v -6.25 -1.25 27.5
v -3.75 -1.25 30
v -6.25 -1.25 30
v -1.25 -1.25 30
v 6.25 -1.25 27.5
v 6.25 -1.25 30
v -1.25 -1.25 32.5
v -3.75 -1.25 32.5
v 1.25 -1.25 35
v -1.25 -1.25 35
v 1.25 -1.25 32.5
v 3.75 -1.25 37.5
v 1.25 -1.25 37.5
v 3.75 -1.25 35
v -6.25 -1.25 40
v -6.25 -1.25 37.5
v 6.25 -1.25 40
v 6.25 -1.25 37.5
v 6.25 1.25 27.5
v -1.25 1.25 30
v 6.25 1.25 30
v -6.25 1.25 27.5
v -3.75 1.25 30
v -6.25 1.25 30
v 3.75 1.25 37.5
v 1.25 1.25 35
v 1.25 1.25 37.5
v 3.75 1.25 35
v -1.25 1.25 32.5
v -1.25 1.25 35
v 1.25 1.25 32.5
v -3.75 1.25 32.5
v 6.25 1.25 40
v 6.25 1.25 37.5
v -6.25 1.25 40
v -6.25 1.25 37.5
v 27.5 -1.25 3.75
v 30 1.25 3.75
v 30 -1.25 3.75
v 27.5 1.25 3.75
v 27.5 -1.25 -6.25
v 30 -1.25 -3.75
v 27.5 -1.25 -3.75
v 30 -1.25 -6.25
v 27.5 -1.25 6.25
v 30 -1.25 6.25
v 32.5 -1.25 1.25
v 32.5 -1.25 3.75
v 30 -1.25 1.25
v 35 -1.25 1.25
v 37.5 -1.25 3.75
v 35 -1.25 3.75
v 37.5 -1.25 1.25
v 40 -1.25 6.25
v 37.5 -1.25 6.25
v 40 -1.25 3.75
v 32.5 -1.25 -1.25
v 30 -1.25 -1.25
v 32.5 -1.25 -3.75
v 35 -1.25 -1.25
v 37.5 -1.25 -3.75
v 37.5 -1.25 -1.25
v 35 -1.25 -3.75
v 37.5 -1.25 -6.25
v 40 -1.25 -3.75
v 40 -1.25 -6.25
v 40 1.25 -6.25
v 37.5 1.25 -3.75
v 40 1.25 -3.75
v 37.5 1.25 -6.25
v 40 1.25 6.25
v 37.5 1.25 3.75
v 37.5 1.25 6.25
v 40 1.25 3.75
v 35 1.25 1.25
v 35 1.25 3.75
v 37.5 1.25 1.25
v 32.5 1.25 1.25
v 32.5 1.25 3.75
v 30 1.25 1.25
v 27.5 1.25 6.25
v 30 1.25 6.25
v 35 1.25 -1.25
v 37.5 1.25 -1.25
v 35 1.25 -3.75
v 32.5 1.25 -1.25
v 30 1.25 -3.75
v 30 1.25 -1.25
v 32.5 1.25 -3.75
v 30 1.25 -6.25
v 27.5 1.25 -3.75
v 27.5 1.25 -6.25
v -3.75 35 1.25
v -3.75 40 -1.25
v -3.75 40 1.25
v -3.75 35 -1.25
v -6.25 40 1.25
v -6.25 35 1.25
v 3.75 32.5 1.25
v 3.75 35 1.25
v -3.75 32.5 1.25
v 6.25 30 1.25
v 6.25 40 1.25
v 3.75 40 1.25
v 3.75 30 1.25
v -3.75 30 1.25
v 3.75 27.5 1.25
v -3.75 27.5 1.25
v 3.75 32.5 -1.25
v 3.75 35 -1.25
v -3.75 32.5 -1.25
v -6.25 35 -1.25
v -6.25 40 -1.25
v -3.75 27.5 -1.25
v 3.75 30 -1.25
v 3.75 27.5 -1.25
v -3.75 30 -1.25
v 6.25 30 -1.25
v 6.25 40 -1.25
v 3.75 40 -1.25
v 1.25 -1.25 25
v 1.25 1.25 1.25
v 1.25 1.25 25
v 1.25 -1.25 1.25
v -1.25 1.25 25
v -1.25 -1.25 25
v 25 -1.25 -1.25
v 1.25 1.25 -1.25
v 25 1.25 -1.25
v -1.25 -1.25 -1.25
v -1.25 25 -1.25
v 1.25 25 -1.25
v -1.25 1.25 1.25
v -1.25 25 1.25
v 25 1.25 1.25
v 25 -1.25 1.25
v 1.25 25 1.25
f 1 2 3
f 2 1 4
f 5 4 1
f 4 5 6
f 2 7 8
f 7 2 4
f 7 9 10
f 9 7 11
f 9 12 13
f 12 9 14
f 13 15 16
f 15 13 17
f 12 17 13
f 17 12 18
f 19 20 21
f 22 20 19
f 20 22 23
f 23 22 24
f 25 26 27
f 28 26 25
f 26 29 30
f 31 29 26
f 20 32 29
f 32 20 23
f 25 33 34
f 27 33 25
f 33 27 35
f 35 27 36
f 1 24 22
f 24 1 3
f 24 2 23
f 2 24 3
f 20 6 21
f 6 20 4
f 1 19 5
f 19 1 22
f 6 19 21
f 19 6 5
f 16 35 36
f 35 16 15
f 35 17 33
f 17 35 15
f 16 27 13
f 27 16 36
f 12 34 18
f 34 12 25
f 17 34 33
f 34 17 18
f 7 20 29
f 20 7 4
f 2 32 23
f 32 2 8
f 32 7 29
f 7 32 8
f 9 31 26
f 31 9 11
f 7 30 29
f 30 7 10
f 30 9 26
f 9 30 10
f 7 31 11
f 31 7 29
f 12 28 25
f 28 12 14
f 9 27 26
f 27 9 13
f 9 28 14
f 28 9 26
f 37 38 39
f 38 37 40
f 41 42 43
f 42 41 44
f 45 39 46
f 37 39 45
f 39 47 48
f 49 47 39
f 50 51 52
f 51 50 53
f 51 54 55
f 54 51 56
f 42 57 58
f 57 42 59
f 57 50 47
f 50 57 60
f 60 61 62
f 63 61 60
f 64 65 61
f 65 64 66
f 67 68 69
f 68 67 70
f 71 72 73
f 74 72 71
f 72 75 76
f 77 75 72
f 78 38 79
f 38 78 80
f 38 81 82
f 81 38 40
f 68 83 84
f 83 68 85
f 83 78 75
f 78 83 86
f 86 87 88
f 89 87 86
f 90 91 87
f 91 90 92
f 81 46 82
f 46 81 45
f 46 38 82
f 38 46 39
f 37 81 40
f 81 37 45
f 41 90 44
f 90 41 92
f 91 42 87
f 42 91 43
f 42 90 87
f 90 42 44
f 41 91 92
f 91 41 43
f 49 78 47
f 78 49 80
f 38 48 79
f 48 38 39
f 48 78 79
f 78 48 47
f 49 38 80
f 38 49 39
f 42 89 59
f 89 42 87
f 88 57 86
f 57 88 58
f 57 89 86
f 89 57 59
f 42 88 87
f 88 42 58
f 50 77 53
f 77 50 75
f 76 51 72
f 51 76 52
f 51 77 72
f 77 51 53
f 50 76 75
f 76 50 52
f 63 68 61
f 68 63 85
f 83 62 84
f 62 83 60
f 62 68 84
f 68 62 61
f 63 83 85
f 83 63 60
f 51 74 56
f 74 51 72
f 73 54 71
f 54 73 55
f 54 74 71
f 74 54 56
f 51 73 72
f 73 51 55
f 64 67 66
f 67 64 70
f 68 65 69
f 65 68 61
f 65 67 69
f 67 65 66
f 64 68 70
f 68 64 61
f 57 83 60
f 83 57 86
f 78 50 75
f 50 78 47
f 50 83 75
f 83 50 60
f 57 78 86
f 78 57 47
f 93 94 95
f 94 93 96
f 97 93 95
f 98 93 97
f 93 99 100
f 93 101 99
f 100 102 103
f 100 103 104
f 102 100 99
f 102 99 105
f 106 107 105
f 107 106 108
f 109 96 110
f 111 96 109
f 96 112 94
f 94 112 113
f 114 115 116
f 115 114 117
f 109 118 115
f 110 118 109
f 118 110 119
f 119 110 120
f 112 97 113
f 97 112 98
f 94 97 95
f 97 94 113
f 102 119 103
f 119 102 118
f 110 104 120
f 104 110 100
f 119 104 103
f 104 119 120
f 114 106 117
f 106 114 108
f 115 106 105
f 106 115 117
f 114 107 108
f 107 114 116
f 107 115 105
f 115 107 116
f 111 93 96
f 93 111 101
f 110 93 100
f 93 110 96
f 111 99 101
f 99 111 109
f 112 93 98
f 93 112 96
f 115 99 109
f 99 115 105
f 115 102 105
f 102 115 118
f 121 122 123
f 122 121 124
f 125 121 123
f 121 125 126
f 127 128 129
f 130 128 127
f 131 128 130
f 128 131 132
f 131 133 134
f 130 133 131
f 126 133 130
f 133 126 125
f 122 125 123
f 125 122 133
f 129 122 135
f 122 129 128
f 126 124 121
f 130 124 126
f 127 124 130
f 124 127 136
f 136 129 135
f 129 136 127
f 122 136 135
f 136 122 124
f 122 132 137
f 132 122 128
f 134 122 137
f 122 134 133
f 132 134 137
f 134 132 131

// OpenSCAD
draw_labels=1;

scale([25,25,25]) {
	translate([-0.05,-0.05,-0.05])
		cube([0.1,0.1,1.05]);
	if (draw_labels) {
		translate([-0.25,0.05,1.1])
			scale([1/10,1/10,1/10])
				rotate(90,[1,0,0])
					drawtext("z");
	}

	translate([-0.05,-0.05,-0.05])
		cube([1.05,0.1,0.1]);
	if (draw_labels) {
		rotate(90,[0,1,0])
			translate([-0.25,0.05,1.1])
				scale([1/10,1/10,1/10])
					rotate(90,[1,0,0])
						drawtext("x");
	}

	translate([-0.05,-0.05,-0.05])
		cube([0.1,1.05,0.1]);
	if (draw_labels) {
		rotate(-90,[1,0,0])
			translate([-0.25,0.05,1.1])
				scale([1/10,1/10,1/10])
					rotate(90,[1,0,0])
						drawtext("y");
	}
}

//Draw character set
//scale([2,2,2]) drawtext(" !\"#$%&'()*+,-./0123456789:;<=>?@ABCDEFGHIJKLMNOPQRSTUVWXYZ[\\]^_`abcdefghijklmnopqrstuvwxyz{|}");

module drawtext(text) {
	//Characters
	chars = " !\"#$%&'()*+,-./0123456789:;<=>?@ABCDEFGHIJKLMNOPQRSTUVWXYZ[\\]^_`abcdefghijklmnopqrstuvwxyz{|}";

	//Chracter table defining 5x7 characters
	//Adapted from: http://www.geocities.com/dinceraydin/djlcdsim/chartable.js
	char_table = [ [ 0, 0, 0, 0, 0, 0, 0],
                  [ 4, 0, 4, 4, 4, 4, 4],
                  [ 0, 0, 0, 0,10,10,10],
                  [10,10,31,10,31,10,10],
                  [ 4,30, 5,14,20,15, 4],
                  [ 3,19, 8, 4, 2,25,24],
                  [13,18,21, 8,20,18,12],
                  [ 0, 0, 0, 0, 8, 4,12],
                  [ 2, 4, 8, 8, 8, 4, 2],
                  [ 8, 4, 2, 2, 2, 4, 8],
                  [ 0, 4,21,14,21, 4, 0],
                  [ 0, 4, 4,31, 4, 4, 0],
                  [ 8, 4,12, 0, 0, 0, 0],
                  [ 0, 0, 0,31, 0, 0, 0],
                  [12,12, 0, 0, 0, 0, 0],
                  [ 0,16, 8, 4, 2, 1, 0],
                  [14,17,25,21,19,17,14],
                  [14, 4, 4, 4, 4,12, 4],
                  [31, 8, 4, 2, 1,17,14],
                  [14,17, 1, 2, 4, 2,31],
                  [ 2, 2,31,18,10, 6, 2],
                  [14,17, 1, 1,30,16,31],
                  [14,17,17,30,16, 8, 6],
                  [ 8, 8, 8, 4, 2, 1,31],
                  [14,17,17,14,17,17,14],
                  [12, 2, 1,15,17,17,14],
                  [ 0,12,12, 0,12,12, 0],
                  [ 8, 4,12, 0,12,12, 0],
                  [ 2, 4, 8,16, 8, 4, 2],
                  [ 0, 0,31, 0,31, 0, 0],
                  [16, 8, 4, 2, 4, 8,16],
                  [ 4, 0, 4, 2, 1,17,14],
                  [14,21,21,13, 1,17,14],
                  [17,17,31,17,17,17,14],
                  [30,17,17,30,17,17,30],
                  [14,17,16,16,16,17,14],
                  [30,17,17,17,17,17,30],
                  [31,16,16,30,16,16,31],
                  [16,16,16,30,16,16,31],
                  [15,17,17,23,16,17,14],
                  [17,17,17,31,17,17,17],
                  [14, 4, 4, 4, 4, 4,14],
                  [12,18, 2, 2, 2, 2, 7],
                  [17,18,20,24,20,18,17],
                  [31,16,16,16,16,16,16],
                  [17,17,17,21,21,27,17],
                  [17,17,19,21,25,17,17],
                  [14,17,17,17,17,17,14],
                  [16,16,16,30,17,17,30],
                  [13,18,21,17,17,17,14],
                  [17,18,20,30,17,17,30],
                  [30, 1, 1,14,16,16,15],
                  [ 4, 4, 4, 4, 4, 4,31],
                  [14,17,17,17,17,17,17],
                  [ 4,10,17,17,17,17,17],
                  [10,21,21,21,17,17,17],
                  [17,17,10, 4,10,17,17],
                  [ 4, 4, 4,10,17,17,17],
                  [31,16, 8, 4, 2, 1,31],
                  [14, 8, 8, 8, 8, 8,14],
                  [ 0, 1, 2, 4, 8,16, 0],
                  [14, 2, 2, 2, 2, 2,14],
                  [ 0, 0, 0, 0,17,10, 4],
                  [31, 0, 0, 0, 0, 0, 0],
                  [ 0, 0, 0, 0, 2, 4, 8],
                  [15,17,15, 1,14, 0, 0],
                  [30,17,17,25,22,16,16],
                  [14,17,16,16,14, 0, 0],
                  [15,17,17,19,13, 1, 1],
                  [14,16,31,17,14, 0, 0],
                  [ 8, 8, 8,28, 8, 9, 6],
                  [14, 1,15,17,15, 0, 0],
                  [17,17,17,25,22,16,16],
                  [14, 4, 4, 4,12, 0, 4],
                  [12,18, 2, 2, 2, 6, 2],
                  [18,20,24,20,18,16,16],
                  [14, 4, 4, 4, 4, 4,12],
                  [17,17,21,21,26, 0, 0],
                  [17,17,17,25,22, 0, 0],
                  [14,17,17,17,14, 0, 0],
                  [16,16,30,17,30, 0, 0],
                  [ 1, 1,15,19,13, 0, 0],
                  [16,16,16,25,22, 0, 0],
                  [30, 1,14,16,15, 0, 0],
                  [ 6, 9, 8, 8,28, 8, 8],
                  [13,19,17,17,17, 0, 0],
                  [ 4,10,17,17,17, 0, 0],
                  [10,21,21,17,17, 0, 0],
                  [17,10, 4,10,17, 0, 0],
                  [14, 1,15,17,17, 0, 0],
                  [31, 8, 4, 2,31, 0, 0],
                  [ 2, 4, 4, 8, 4, 4, 2],
                  [ 4, 4, 4, 4, 4, 4, 4],
                  [ 8, 4, 4, 2, 4, 4, 8] ];

	//Binary decode table
	dec_table = [ "00000", "00001", "00010", "00011", "00100", "00101",
  	            "00110", "00111", "01000", "01001", "01010", "01011",
  	            "01100", "01101", "01110", "01111", "10000", "10001",
  	            "10010", "10011", "10100", "10101", "10110", "10111",
	            "11000", "11001", "11010", "11011", "11100", "11101",
	            "11110", "11111" ];

	//Process string one character at a time
	for(itext = [0:len(text)-1]) {
		//Convert character to index
		assign(ichar = search(text[itext],chars,1)[0]) {
			//Decode character - rows
			for(irow = [0:6]) {
				assign(val = dec_table[char_table[ichar][irow]]) {
					//Decode character - cols
					for(icol = [0:4]) {
						assign(bit = search(val[icol],"01",1)[0]) {
							if(bit) {
								//Output cube
								translate([icol + (6*itext), irow, 0])
									cube([1.0001,1.0001,1]);
							}
						}
					}
				}
			}
		}
	}
}
